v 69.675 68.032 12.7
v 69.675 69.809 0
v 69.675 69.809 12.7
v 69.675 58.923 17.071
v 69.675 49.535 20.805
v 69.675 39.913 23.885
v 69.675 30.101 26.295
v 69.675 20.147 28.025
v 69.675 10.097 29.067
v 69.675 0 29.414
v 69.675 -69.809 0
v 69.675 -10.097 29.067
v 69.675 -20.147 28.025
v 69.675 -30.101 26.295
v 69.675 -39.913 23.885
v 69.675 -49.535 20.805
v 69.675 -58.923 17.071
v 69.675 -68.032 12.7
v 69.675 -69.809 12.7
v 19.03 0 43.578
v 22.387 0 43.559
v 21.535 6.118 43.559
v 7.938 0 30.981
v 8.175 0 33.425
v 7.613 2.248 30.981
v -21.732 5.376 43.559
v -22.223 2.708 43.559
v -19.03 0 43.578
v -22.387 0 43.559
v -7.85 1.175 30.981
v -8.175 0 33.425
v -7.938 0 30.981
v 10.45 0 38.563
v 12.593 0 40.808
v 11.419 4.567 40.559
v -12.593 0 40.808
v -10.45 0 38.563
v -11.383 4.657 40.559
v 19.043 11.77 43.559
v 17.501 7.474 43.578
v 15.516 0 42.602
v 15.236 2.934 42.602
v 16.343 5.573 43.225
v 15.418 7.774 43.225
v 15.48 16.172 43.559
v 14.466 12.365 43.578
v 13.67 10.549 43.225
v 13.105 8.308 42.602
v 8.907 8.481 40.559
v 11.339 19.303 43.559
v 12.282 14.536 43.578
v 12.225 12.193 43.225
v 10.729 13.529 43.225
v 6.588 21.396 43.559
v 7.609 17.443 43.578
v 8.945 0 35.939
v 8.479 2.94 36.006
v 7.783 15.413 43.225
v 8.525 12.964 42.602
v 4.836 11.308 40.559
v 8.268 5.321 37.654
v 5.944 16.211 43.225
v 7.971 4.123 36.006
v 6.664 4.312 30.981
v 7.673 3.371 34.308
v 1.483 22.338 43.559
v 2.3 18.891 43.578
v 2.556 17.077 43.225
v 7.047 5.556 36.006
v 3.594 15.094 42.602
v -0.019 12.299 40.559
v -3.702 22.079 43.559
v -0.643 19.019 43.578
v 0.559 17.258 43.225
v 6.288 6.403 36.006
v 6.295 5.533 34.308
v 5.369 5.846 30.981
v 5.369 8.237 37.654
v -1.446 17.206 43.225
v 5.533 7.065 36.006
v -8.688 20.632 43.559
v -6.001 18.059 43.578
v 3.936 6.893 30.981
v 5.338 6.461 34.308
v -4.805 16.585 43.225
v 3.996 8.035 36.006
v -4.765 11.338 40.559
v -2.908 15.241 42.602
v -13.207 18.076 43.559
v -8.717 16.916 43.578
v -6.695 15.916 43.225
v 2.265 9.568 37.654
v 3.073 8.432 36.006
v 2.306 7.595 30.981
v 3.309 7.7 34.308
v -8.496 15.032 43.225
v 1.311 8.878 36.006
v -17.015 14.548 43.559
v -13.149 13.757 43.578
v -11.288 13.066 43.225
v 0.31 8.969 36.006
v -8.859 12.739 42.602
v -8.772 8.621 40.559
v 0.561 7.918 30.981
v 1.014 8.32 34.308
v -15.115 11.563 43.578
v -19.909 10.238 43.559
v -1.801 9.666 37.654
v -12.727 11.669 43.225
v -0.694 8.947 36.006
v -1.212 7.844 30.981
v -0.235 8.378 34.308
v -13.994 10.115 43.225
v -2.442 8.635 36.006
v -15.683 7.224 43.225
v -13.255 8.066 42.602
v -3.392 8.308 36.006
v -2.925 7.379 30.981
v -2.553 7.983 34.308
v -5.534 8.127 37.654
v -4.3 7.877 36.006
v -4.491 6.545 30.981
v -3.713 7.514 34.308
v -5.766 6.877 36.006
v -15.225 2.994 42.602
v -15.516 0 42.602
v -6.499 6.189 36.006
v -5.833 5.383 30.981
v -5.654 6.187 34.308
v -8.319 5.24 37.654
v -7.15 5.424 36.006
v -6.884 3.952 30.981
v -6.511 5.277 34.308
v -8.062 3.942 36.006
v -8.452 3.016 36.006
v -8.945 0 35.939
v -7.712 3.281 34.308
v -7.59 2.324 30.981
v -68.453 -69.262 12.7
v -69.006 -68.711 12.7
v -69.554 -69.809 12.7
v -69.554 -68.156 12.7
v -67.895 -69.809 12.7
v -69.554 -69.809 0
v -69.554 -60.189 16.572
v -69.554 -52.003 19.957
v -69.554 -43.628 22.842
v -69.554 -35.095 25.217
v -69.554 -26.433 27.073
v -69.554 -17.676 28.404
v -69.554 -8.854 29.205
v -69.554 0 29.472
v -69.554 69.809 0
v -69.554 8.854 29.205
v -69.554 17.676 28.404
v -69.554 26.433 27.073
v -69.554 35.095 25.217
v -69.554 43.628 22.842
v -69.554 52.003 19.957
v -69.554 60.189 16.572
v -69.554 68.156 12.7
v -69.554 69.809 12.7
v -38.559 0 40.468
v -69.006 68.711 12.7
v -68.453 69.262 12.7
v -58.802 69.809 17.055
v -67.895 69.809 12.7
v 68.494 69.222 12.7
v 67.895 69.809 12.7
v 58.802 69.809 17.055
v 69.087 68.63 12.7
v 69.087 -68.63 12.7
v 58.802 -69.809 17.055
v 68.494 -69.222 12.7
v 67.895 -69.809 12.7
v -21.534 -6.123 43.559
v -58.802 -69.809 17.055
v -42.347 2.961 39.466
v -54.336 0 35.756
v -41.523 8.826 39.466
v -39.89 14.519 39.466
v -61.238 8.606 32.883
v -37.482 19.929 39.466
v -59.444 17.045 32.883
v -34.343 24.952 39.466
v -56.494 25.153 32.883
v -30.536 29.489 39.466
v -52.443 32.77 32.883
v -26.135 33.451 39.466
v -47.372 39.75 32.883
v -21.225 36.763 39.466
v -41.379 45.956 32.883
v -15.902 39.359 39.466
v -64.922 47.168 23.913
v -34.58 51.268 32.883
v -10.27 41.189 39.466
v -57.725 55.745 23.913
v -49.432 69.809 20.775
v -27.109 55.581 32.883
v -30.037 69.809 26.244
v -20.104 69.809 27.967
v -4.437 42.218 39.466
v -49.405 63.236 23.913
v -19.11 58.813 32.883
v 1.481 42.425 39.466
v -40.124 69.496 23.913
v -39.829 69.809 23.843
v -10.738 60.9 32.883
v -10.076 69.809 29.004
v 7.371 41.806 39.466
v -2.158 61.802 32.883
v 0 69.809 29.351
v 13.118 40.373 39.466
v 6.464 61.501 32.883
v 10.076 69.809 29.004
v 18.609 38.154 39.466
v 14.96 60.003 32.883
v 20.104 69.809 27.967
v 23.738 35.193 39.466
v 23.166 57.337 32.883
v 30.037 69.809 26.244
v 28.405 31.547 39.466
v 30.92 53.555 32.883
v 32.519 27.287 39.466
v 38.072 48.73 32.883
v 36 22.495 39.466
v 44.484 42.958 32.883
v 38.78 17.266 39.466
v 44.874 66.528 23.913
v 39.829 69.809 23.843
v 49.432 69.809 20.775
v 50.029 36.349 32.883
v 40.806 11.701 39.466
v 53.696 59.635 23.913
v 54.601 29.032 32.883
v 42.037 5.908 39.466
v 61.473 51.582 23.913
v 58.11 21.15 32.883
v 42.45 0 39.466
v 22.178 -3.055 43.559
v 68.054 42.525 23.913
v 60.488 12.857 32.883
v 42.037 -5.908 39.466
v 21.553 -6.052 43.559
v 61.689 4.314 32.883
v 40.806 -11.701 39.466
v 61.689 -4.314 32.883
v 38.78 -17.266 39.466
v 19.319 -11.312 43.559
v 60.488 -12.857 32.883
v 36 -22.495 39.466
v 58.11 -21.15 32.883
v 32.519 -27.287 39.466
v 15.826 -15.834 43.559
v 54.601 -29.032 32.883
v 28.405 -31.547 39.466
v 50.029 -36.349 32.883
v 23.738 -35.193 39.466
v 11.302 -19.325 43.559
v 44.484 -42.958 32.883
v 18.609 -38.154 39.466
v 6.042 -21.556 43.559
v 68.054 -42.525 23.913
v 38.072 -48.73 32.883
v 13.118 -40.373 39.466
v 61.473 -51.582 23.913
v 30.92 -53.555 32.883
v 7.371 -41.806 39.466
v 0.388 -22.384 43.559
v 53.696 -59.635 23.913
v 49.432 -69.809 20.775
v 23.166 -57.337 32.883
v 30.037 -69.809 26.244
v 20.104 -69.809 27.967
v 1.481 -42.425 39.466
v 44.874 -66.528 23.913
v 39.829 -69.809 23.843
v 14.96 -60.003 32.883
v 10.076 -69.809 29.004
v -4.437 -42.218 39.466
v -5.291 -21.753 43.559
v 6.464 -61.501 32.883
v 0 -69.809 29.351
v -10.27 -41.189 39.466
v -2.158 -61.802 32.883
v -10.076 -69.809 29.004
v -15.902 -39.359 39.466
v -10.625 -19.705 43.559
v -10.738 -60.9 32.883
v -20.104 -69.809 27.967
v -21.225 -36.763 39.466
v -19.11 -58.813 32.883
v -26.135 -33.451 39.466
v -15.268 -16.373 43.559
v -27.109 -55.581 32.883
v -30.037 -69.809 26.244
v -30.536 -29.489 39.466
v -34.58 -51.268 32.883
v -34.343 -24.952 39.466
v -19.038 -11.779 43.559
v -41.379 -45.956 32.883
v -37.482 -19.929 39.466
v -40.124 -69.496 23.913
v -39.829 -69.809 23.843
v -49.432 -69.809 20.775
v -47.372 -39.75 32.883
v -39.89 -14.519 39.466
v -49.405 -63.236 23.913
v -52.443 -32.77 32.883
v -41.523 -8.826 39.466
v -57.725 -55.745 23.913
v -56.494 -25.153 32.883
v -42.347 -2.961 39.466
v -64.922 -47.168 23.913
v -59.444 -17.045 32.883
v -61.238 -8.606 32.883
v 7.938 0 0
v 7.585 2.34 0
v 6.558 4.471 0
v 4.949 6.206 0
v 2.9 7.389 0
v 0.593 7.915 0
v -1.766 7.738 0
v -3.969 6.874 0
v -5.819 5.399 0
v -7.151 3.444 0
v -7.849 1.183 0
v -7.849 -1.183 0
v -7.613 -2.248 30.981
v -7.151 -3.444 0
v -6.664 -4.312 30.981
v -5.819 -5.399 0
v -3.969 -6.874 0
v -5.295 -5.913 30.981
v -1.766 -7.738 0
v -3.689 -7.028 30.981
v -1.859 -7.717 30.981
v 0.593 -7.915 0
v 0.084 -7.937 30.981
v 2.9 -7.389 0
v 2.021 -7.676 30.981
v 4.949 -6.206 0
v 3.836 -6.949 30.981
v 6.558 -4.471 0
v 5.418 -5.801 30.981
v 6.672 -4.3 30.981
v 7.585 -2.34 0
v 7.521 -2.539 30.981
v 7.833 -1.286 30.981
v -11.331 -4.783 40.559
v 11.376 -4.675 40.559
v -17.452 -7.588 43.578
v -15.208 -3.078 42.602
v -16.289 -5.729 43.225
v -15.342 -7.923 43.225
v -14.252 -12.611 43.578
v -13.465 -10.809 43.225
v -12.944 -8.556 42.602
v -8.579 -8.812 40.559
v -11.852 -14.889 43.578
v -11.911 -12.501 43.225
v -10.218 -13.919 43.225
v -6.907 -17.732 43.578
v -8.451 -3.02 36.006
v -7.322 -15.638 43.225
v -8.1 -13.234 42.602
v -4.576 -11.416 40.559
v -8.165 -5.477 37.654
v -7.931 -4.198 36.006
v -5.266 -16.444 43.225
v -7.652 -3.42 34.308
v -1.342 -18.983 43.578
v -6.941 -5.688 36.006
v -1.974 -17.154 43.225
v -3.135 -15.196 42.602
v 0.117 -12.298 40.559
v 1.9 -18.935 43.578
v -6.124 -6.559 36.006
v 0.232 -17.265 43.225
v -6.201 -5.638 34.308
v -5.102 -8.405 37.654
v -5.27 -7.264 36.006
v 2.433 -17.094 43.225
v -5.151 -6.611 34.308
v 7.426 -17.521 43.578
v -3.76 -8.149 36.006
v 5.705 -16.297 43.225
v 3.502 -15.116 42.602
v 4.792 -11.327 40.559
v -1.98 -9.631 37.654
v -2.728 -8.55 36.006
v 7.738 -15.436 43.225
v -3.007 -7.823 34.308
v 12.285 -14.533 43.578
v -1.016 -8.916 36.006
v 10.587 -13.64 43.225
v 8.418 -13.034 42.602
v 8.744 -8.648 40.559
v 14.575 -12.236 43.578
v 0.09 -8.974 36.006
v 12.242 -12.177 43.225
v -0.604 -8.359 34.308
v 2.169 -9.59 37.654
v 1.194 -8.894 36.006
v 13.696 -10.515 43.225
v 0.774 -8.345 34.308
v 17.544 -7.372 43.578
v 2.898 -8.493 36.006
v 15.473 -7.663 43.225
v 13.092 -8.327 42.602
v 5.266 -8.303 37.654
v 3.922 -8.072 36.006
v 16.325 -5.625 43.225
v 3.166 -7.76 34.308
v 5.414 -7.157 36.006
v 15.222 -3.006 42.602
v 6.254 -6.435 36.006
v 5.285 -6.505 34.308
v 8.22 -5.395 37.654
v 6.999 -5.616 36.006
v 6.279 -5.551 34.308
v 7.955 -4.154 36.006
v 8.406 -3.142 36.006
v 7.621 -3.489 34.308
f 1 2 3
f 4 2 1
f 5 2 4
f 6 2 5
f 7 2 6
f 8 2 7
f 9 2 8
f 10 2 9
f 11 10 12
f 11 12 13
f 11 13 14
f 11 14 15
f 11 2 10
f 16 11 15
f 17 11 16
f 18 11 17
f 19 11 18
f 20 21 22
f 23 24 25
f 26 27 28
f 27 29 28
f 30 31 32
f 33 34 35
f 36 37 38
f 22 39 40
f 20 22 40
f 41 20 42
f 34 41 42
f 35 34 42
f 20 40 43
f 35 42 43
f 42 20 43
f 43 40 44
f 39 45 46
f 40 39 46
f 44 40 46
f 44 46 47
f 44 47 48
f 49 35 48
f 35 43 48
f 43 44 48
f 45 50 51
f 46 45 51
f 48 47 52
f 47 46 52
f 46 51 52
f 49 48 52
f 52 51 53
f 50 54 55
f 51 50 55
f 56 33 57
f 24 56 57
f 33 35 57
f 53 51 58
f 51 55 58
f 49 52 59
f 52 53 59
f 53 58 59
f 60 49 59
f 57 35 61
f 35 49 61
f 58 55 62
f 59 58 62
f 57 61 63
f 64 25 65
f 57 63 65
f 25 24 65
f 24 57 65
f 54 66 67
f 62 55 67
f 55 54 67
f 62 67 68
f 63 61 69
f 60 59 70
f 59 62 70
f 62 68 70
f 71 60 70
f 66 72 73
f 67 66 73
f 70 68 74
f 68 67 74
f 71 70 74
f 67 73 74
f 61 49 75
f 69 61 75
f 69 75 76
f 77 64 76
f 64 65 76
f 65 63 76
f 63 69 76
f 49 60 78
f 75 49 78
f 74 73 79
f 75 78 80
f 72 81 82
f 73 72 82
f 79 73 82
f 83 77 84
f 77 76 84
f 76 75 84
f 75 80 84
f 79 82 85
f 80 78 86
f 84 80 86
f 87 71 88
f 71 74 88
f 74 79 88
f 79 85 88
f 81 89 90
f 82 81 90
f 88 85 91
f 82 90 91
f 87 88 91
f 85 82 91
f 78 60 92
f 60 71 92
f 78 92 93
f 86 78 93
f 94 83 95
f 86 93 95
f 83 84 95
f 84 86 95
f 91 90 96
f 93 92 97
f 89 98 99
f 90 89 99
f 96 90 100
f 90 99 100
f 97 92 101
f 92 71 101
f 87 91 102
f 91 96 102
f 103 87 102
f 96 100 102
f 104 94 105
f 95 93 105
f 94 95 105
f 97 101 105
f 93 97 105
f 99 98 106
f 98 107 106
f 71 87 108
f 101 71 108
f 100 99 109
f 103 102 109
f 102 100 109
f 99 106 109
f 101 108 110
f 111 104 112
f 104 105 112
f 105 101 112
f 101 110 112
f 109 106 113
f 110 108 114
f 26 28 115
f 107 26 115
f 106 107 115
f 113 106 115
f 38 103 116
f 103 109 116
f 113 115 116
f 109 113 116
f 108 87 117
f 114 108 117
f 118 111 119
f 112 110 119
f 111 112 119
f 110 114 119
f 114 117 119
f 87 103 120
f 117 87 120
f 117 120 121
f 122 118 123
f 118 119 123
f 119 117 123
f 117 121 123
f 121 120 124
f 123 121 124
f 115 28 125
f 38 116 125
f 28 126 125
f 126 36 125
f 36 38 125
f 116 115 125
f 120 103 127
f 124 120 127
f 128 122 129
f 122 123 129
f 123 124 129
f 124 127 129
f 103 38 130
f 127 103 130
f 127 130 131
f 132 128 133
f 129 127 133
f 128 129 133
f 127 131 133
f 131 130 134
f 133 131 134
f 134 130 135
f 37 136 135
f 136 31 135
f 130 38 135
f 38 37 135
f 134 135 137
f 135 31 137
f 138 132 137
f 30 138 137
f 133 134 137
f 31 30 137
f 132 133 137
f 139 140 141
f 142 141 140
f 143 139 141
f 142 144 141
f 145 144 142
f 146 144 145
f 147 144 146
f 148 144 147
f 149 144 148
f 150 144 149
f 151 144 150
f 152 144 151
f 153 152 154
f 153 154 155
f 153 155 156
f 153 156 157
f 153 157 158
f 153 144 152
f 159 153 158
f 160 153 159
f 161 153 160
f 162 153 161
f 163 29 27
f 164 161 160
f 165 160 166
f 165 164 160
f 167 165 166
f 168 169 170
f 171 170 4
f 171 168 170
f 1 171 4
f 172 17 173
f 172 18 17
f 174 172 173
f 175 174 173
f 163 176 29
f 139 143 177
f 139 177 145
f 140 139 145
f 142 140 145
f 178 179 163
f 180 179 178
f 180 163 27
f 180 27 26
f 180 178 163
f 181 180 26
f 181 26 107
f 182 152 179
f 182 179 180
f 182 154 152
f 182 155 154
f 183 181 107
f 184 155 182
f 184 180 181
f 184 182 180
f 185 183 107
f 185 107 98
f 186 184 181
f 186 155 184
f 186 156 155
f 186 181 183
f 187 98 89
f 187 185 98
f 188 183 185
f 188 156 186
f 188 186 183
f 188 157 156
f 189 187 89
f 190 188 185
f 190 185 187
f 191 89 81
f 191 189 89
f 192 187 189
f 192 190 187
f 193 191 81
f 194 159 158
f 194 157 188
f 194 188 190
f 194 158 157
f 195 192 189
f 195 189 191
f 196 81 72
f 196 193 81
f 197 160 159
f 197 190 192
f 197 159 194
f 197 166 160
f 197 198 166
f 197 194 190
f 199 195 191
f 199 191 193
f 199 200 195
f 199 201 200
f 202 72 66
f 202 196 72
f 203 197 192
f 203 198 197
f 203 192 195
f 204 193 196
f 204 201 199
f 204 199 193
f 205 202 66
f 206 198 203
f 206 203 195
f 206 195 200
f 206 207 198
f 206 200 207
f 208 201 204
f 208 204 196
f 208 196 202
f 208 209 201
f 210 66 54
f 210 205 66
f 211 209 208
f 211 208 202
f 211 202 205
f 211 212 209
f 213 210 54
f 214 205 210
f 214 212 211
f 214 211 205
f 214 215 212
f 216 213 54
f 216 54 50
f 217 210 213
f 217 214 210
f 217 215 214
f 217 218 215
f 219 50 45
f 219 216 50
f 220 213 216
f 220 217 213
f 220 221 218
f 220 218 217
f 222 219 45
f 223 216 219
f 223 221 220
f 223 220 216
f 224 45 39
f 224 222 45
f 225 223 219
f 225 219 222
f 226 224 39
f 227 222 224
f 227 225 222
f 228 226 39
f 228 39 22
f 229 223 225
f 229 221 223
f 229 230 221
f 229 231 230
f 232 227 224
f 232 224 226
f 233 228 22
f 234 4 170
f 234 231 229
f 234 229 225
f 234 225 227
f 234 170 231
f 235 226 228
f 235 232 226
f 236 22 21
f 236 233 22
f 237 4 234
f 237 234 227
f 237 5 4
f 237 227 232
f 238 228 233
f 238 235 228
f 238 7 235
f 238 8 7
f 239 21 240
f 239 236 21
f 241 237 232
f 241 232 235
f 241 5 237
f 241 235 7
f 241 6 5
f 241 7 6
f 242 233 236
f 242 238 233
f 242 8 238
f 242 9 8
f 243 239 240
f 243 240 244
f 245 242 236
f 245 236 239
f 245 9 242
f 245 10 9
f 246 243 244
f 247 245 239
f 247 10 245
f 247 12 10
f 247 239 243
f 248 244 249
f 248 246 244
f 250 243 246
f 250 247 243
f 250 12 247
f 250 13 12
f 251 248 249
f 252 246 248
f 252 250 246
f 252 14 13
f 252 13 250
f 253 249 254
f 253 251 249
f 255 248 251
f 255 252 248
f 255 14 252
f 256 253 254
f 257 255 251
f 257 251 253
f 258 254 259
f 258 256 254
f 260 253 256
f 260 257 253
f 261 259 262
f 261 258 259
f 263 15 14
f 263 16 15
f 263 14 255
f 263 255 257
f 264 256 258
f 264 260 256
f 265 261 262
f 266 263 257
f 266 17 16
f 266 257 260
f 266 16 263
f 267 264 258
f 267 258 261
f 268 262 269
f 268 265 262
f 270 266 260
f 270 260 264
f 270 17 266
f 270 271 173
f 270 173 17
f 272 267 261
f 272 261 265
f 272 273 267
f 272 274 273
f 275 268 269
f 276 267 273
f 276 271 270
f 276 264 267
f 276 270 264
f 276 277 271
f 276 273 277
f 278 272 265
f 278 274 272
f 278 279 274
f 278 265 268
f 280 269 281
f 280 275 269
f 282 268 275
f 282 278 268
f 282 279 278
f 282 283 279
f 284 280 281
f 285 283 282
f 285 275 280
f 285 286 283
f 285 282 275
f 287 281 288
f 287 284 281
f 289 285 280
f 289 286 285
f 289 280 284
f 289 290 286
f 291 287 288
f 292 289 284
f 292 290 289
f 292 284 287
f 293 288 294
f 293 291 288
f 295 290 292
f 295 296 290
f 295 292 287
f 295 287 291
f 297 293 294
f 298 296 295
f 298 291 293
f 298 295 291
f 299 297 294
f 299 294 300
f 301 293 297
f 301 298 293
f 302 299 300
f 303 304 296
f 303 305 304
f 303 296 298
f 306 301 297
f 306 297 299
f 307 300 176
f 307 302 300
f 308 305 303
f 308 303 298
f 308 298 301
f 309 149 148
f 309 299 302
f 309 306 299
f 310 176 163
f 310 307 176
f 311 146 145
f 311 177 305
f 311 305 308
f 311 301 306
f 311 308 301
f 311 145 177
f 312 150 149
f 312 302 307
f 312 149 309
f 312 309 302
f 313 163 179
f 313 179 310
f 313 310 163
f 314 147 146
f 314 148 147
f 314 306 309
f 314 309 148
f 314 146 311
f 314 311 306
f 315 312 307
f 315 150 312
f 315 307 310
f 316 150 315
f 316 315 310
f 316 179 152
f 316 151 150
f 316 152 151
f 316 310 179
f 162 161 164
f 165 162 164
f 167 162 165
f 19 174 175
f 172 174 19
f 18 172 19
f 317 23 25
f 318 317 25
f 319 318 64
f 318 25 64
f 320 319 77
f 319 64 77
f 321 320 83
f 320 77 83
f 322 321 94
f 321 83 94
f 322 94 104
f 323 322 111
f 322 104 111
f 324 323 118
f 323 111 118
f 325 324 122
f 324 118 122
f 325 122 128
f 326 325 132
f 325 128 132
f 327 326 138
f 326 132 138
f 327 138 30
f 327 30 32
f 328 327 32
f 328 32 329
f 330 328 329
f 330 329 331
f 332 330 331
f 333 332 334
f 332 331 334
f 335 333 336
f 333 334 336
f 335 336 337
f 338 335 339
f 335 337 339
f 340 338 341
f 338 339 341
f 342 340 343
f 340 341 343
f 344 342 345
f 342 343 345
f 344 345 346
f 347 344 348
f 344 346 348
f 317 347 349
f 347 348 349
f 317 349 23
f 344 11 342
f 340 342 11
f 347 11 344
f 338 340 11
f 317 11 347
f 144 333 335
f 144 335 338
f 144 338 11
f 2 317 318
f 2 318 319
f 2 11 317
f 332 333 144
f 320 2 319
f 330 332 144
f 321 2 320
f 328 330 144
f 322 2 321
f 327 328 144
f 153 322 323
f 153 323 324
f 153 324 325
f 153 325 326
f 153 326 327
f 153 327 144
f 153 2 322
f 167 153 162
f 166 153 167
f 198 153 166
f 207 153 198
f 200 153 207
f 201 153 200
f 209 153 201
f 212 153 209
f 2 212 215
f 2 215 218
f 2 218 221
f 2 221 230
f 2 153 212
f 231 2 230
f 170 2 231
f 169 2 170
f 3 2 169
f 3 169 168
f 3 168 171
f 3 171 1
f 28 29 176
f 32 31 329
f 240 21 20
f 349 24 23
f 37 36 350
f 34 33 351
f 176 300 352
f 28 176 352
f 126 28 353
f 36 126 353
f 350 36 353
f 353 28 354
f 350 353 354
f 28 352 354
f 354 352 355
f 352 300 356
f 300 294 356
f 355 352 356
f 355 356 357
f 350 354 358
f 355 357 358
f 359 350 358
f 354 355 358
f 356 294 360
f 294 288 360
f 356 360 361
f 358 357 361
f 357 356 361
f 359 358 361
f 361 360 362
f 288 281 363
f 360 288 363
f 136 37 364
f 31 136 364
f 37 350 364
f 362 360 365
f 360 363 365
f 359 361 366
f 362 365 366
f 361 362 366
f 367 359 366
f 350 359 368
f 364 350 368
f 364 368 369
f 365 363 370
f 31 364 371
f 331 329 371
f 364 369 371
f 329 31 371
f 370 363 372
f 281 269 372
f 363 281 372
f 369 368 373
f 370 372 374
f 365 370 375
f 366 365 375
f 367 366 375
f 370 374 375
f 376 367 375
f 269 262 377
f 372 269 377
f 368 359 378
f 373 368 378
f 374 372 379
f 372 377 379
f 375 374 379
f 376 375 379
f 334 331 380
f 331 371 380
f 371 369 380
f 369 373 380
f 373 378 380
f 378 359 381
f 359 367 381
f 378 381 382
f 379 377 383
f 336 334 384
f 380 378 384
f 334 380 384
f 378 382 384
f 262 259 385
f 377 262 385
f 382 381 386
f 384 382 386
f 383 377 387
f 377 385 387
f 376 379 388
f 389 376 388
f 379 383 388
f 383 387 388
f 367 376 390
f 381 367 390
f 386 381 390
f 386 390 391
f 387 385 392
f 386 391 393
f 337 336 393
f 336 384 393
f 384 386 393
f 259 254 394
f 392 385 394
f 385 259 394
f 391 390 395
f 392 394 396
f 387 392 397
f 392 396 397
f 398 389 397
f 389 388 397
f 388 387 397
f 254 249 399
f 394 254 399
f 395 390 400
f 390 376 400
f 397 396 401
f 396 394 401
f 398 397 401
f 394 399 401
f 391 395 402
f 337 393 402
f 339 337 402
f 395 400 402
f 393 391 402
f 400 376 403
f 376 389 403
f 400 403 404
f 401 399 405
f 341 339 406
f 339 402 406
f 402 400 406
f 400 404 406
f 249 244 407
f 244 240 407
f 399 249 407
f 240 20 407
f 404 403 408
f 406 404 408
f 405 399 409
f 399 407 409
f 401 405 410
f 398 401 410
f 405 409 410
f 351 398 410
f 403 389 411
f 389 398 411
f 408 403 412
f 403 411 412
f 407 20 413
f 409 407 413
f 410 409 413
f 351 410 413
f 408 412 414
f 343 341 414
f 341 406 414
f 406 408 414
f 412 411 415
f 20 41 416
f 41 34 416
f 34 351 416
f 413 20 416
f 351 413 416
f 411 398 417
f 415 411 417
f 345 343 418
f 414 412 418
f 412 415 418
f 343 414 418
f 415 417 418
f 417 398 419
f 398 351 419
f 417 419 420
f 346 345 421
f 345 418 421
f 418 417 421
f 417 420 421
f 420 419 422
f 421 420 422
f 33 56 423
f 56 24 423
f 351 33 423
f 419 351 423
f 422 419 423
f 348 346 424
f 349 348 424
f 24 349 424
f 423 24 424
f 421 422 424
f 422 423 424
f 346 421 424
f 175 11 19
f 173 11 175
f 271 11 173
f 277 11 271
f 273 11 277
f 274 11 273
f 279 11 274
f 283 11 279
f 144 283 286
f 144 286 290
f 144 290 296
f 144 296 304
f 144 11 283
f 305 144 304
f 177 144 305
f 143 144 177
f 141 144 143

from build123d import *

# Parameters (mm, degrees)
F0_W     = 139.7
F0_H     = 139.7
F0_R     = 7.9375
F1_DEPTH = 12.7
F4_W     = 59.6992075443
F4_H     = 63.3541112766
F4_W_2   = 56.6389337182
F4_H_2   = 62.1770434082
F5_DEPTH = 101.6
F6_W     = 47.2303777933
F6_H     = 39.3290324137
F6_W_2   = 46.0887253284
F6_H_2   = 41.5412890725
F7_DEPTH = 101.6
F9_DEPTH = 76.2
F10_R    = 12.7


# Not quite as in the source:
# - a feature names something its author has since deleted; it is built from what else it names


with BuildPart() as f1:
    # F0 (on Top) → F1 (new body)
    with BuildSketch(Plane.XY):
        Rectangle(F0_W, F0_H)
        Circle(F0_R, mode=Mode.SUBTRACT)
    extrude(amount=F1_DEPTH)

    # F2 (on Front) → F3 (revolve)
    with BuildSketch(Plane.XZ):
        with BuildLine():
            Line((0, 0), (0, 45.1088836892))
            ThreePointArc((0, 45.1088836892), (-60.5414406288, 33.4106062222), (-112.3665997793, 0))
            Line((-112.3665997793, 0), (0, 0))
        make_face()
    revolve(axis=Axis((0, 0, 22.5544418446), (0, 0, -1)))

    # F4 (on Front) → F5 (cut, symmetric)
    with BuildSketch(Plane.XZ):
        with Locations((-99.4039475918, 19.7528828867)):
            Rectangle(F4_W, F4_H)
        with Locations((97.9946739972, 18.4055566788)):
            Rectangle(F4_W_2, F4_H_2)
    extrude(amount=F5_DEPTH, both=True, mode=Mode.SUBTRACT)

    # F6 (on Right) → F7 (cut, symmetric)
    with BuildSketch(Plane.YZ):
        with Locations((-93.4242233634, 10.9358266927)):
            Rectangle(F6_W, F6_H)
        with Locations((92.853397131, 9.8296983633)):
            Rectangle(F6_W_2, F6_H_2)
    extrude(amount=F7_DEPTH, both=True, mode=Mode.SUBTRACT)

    # F0 (on Top) → F9 (cut, symmetric)
    with BuildSketch(Plane.XY):
        Circle(F0_R)
    extrude(amount=F9_DEPTH, both=True, mode=Mode.SUBTRACT)

    # F10
    f10_edges = [f1.edges().sort_by_distance(p)[0] for p in [
        (0, -7.9375, 44.914919),
        (0, 7.9375, 44.914919),
    ]]
    fillet(f10_edges, radius=F10_R)


solid = f1.part
